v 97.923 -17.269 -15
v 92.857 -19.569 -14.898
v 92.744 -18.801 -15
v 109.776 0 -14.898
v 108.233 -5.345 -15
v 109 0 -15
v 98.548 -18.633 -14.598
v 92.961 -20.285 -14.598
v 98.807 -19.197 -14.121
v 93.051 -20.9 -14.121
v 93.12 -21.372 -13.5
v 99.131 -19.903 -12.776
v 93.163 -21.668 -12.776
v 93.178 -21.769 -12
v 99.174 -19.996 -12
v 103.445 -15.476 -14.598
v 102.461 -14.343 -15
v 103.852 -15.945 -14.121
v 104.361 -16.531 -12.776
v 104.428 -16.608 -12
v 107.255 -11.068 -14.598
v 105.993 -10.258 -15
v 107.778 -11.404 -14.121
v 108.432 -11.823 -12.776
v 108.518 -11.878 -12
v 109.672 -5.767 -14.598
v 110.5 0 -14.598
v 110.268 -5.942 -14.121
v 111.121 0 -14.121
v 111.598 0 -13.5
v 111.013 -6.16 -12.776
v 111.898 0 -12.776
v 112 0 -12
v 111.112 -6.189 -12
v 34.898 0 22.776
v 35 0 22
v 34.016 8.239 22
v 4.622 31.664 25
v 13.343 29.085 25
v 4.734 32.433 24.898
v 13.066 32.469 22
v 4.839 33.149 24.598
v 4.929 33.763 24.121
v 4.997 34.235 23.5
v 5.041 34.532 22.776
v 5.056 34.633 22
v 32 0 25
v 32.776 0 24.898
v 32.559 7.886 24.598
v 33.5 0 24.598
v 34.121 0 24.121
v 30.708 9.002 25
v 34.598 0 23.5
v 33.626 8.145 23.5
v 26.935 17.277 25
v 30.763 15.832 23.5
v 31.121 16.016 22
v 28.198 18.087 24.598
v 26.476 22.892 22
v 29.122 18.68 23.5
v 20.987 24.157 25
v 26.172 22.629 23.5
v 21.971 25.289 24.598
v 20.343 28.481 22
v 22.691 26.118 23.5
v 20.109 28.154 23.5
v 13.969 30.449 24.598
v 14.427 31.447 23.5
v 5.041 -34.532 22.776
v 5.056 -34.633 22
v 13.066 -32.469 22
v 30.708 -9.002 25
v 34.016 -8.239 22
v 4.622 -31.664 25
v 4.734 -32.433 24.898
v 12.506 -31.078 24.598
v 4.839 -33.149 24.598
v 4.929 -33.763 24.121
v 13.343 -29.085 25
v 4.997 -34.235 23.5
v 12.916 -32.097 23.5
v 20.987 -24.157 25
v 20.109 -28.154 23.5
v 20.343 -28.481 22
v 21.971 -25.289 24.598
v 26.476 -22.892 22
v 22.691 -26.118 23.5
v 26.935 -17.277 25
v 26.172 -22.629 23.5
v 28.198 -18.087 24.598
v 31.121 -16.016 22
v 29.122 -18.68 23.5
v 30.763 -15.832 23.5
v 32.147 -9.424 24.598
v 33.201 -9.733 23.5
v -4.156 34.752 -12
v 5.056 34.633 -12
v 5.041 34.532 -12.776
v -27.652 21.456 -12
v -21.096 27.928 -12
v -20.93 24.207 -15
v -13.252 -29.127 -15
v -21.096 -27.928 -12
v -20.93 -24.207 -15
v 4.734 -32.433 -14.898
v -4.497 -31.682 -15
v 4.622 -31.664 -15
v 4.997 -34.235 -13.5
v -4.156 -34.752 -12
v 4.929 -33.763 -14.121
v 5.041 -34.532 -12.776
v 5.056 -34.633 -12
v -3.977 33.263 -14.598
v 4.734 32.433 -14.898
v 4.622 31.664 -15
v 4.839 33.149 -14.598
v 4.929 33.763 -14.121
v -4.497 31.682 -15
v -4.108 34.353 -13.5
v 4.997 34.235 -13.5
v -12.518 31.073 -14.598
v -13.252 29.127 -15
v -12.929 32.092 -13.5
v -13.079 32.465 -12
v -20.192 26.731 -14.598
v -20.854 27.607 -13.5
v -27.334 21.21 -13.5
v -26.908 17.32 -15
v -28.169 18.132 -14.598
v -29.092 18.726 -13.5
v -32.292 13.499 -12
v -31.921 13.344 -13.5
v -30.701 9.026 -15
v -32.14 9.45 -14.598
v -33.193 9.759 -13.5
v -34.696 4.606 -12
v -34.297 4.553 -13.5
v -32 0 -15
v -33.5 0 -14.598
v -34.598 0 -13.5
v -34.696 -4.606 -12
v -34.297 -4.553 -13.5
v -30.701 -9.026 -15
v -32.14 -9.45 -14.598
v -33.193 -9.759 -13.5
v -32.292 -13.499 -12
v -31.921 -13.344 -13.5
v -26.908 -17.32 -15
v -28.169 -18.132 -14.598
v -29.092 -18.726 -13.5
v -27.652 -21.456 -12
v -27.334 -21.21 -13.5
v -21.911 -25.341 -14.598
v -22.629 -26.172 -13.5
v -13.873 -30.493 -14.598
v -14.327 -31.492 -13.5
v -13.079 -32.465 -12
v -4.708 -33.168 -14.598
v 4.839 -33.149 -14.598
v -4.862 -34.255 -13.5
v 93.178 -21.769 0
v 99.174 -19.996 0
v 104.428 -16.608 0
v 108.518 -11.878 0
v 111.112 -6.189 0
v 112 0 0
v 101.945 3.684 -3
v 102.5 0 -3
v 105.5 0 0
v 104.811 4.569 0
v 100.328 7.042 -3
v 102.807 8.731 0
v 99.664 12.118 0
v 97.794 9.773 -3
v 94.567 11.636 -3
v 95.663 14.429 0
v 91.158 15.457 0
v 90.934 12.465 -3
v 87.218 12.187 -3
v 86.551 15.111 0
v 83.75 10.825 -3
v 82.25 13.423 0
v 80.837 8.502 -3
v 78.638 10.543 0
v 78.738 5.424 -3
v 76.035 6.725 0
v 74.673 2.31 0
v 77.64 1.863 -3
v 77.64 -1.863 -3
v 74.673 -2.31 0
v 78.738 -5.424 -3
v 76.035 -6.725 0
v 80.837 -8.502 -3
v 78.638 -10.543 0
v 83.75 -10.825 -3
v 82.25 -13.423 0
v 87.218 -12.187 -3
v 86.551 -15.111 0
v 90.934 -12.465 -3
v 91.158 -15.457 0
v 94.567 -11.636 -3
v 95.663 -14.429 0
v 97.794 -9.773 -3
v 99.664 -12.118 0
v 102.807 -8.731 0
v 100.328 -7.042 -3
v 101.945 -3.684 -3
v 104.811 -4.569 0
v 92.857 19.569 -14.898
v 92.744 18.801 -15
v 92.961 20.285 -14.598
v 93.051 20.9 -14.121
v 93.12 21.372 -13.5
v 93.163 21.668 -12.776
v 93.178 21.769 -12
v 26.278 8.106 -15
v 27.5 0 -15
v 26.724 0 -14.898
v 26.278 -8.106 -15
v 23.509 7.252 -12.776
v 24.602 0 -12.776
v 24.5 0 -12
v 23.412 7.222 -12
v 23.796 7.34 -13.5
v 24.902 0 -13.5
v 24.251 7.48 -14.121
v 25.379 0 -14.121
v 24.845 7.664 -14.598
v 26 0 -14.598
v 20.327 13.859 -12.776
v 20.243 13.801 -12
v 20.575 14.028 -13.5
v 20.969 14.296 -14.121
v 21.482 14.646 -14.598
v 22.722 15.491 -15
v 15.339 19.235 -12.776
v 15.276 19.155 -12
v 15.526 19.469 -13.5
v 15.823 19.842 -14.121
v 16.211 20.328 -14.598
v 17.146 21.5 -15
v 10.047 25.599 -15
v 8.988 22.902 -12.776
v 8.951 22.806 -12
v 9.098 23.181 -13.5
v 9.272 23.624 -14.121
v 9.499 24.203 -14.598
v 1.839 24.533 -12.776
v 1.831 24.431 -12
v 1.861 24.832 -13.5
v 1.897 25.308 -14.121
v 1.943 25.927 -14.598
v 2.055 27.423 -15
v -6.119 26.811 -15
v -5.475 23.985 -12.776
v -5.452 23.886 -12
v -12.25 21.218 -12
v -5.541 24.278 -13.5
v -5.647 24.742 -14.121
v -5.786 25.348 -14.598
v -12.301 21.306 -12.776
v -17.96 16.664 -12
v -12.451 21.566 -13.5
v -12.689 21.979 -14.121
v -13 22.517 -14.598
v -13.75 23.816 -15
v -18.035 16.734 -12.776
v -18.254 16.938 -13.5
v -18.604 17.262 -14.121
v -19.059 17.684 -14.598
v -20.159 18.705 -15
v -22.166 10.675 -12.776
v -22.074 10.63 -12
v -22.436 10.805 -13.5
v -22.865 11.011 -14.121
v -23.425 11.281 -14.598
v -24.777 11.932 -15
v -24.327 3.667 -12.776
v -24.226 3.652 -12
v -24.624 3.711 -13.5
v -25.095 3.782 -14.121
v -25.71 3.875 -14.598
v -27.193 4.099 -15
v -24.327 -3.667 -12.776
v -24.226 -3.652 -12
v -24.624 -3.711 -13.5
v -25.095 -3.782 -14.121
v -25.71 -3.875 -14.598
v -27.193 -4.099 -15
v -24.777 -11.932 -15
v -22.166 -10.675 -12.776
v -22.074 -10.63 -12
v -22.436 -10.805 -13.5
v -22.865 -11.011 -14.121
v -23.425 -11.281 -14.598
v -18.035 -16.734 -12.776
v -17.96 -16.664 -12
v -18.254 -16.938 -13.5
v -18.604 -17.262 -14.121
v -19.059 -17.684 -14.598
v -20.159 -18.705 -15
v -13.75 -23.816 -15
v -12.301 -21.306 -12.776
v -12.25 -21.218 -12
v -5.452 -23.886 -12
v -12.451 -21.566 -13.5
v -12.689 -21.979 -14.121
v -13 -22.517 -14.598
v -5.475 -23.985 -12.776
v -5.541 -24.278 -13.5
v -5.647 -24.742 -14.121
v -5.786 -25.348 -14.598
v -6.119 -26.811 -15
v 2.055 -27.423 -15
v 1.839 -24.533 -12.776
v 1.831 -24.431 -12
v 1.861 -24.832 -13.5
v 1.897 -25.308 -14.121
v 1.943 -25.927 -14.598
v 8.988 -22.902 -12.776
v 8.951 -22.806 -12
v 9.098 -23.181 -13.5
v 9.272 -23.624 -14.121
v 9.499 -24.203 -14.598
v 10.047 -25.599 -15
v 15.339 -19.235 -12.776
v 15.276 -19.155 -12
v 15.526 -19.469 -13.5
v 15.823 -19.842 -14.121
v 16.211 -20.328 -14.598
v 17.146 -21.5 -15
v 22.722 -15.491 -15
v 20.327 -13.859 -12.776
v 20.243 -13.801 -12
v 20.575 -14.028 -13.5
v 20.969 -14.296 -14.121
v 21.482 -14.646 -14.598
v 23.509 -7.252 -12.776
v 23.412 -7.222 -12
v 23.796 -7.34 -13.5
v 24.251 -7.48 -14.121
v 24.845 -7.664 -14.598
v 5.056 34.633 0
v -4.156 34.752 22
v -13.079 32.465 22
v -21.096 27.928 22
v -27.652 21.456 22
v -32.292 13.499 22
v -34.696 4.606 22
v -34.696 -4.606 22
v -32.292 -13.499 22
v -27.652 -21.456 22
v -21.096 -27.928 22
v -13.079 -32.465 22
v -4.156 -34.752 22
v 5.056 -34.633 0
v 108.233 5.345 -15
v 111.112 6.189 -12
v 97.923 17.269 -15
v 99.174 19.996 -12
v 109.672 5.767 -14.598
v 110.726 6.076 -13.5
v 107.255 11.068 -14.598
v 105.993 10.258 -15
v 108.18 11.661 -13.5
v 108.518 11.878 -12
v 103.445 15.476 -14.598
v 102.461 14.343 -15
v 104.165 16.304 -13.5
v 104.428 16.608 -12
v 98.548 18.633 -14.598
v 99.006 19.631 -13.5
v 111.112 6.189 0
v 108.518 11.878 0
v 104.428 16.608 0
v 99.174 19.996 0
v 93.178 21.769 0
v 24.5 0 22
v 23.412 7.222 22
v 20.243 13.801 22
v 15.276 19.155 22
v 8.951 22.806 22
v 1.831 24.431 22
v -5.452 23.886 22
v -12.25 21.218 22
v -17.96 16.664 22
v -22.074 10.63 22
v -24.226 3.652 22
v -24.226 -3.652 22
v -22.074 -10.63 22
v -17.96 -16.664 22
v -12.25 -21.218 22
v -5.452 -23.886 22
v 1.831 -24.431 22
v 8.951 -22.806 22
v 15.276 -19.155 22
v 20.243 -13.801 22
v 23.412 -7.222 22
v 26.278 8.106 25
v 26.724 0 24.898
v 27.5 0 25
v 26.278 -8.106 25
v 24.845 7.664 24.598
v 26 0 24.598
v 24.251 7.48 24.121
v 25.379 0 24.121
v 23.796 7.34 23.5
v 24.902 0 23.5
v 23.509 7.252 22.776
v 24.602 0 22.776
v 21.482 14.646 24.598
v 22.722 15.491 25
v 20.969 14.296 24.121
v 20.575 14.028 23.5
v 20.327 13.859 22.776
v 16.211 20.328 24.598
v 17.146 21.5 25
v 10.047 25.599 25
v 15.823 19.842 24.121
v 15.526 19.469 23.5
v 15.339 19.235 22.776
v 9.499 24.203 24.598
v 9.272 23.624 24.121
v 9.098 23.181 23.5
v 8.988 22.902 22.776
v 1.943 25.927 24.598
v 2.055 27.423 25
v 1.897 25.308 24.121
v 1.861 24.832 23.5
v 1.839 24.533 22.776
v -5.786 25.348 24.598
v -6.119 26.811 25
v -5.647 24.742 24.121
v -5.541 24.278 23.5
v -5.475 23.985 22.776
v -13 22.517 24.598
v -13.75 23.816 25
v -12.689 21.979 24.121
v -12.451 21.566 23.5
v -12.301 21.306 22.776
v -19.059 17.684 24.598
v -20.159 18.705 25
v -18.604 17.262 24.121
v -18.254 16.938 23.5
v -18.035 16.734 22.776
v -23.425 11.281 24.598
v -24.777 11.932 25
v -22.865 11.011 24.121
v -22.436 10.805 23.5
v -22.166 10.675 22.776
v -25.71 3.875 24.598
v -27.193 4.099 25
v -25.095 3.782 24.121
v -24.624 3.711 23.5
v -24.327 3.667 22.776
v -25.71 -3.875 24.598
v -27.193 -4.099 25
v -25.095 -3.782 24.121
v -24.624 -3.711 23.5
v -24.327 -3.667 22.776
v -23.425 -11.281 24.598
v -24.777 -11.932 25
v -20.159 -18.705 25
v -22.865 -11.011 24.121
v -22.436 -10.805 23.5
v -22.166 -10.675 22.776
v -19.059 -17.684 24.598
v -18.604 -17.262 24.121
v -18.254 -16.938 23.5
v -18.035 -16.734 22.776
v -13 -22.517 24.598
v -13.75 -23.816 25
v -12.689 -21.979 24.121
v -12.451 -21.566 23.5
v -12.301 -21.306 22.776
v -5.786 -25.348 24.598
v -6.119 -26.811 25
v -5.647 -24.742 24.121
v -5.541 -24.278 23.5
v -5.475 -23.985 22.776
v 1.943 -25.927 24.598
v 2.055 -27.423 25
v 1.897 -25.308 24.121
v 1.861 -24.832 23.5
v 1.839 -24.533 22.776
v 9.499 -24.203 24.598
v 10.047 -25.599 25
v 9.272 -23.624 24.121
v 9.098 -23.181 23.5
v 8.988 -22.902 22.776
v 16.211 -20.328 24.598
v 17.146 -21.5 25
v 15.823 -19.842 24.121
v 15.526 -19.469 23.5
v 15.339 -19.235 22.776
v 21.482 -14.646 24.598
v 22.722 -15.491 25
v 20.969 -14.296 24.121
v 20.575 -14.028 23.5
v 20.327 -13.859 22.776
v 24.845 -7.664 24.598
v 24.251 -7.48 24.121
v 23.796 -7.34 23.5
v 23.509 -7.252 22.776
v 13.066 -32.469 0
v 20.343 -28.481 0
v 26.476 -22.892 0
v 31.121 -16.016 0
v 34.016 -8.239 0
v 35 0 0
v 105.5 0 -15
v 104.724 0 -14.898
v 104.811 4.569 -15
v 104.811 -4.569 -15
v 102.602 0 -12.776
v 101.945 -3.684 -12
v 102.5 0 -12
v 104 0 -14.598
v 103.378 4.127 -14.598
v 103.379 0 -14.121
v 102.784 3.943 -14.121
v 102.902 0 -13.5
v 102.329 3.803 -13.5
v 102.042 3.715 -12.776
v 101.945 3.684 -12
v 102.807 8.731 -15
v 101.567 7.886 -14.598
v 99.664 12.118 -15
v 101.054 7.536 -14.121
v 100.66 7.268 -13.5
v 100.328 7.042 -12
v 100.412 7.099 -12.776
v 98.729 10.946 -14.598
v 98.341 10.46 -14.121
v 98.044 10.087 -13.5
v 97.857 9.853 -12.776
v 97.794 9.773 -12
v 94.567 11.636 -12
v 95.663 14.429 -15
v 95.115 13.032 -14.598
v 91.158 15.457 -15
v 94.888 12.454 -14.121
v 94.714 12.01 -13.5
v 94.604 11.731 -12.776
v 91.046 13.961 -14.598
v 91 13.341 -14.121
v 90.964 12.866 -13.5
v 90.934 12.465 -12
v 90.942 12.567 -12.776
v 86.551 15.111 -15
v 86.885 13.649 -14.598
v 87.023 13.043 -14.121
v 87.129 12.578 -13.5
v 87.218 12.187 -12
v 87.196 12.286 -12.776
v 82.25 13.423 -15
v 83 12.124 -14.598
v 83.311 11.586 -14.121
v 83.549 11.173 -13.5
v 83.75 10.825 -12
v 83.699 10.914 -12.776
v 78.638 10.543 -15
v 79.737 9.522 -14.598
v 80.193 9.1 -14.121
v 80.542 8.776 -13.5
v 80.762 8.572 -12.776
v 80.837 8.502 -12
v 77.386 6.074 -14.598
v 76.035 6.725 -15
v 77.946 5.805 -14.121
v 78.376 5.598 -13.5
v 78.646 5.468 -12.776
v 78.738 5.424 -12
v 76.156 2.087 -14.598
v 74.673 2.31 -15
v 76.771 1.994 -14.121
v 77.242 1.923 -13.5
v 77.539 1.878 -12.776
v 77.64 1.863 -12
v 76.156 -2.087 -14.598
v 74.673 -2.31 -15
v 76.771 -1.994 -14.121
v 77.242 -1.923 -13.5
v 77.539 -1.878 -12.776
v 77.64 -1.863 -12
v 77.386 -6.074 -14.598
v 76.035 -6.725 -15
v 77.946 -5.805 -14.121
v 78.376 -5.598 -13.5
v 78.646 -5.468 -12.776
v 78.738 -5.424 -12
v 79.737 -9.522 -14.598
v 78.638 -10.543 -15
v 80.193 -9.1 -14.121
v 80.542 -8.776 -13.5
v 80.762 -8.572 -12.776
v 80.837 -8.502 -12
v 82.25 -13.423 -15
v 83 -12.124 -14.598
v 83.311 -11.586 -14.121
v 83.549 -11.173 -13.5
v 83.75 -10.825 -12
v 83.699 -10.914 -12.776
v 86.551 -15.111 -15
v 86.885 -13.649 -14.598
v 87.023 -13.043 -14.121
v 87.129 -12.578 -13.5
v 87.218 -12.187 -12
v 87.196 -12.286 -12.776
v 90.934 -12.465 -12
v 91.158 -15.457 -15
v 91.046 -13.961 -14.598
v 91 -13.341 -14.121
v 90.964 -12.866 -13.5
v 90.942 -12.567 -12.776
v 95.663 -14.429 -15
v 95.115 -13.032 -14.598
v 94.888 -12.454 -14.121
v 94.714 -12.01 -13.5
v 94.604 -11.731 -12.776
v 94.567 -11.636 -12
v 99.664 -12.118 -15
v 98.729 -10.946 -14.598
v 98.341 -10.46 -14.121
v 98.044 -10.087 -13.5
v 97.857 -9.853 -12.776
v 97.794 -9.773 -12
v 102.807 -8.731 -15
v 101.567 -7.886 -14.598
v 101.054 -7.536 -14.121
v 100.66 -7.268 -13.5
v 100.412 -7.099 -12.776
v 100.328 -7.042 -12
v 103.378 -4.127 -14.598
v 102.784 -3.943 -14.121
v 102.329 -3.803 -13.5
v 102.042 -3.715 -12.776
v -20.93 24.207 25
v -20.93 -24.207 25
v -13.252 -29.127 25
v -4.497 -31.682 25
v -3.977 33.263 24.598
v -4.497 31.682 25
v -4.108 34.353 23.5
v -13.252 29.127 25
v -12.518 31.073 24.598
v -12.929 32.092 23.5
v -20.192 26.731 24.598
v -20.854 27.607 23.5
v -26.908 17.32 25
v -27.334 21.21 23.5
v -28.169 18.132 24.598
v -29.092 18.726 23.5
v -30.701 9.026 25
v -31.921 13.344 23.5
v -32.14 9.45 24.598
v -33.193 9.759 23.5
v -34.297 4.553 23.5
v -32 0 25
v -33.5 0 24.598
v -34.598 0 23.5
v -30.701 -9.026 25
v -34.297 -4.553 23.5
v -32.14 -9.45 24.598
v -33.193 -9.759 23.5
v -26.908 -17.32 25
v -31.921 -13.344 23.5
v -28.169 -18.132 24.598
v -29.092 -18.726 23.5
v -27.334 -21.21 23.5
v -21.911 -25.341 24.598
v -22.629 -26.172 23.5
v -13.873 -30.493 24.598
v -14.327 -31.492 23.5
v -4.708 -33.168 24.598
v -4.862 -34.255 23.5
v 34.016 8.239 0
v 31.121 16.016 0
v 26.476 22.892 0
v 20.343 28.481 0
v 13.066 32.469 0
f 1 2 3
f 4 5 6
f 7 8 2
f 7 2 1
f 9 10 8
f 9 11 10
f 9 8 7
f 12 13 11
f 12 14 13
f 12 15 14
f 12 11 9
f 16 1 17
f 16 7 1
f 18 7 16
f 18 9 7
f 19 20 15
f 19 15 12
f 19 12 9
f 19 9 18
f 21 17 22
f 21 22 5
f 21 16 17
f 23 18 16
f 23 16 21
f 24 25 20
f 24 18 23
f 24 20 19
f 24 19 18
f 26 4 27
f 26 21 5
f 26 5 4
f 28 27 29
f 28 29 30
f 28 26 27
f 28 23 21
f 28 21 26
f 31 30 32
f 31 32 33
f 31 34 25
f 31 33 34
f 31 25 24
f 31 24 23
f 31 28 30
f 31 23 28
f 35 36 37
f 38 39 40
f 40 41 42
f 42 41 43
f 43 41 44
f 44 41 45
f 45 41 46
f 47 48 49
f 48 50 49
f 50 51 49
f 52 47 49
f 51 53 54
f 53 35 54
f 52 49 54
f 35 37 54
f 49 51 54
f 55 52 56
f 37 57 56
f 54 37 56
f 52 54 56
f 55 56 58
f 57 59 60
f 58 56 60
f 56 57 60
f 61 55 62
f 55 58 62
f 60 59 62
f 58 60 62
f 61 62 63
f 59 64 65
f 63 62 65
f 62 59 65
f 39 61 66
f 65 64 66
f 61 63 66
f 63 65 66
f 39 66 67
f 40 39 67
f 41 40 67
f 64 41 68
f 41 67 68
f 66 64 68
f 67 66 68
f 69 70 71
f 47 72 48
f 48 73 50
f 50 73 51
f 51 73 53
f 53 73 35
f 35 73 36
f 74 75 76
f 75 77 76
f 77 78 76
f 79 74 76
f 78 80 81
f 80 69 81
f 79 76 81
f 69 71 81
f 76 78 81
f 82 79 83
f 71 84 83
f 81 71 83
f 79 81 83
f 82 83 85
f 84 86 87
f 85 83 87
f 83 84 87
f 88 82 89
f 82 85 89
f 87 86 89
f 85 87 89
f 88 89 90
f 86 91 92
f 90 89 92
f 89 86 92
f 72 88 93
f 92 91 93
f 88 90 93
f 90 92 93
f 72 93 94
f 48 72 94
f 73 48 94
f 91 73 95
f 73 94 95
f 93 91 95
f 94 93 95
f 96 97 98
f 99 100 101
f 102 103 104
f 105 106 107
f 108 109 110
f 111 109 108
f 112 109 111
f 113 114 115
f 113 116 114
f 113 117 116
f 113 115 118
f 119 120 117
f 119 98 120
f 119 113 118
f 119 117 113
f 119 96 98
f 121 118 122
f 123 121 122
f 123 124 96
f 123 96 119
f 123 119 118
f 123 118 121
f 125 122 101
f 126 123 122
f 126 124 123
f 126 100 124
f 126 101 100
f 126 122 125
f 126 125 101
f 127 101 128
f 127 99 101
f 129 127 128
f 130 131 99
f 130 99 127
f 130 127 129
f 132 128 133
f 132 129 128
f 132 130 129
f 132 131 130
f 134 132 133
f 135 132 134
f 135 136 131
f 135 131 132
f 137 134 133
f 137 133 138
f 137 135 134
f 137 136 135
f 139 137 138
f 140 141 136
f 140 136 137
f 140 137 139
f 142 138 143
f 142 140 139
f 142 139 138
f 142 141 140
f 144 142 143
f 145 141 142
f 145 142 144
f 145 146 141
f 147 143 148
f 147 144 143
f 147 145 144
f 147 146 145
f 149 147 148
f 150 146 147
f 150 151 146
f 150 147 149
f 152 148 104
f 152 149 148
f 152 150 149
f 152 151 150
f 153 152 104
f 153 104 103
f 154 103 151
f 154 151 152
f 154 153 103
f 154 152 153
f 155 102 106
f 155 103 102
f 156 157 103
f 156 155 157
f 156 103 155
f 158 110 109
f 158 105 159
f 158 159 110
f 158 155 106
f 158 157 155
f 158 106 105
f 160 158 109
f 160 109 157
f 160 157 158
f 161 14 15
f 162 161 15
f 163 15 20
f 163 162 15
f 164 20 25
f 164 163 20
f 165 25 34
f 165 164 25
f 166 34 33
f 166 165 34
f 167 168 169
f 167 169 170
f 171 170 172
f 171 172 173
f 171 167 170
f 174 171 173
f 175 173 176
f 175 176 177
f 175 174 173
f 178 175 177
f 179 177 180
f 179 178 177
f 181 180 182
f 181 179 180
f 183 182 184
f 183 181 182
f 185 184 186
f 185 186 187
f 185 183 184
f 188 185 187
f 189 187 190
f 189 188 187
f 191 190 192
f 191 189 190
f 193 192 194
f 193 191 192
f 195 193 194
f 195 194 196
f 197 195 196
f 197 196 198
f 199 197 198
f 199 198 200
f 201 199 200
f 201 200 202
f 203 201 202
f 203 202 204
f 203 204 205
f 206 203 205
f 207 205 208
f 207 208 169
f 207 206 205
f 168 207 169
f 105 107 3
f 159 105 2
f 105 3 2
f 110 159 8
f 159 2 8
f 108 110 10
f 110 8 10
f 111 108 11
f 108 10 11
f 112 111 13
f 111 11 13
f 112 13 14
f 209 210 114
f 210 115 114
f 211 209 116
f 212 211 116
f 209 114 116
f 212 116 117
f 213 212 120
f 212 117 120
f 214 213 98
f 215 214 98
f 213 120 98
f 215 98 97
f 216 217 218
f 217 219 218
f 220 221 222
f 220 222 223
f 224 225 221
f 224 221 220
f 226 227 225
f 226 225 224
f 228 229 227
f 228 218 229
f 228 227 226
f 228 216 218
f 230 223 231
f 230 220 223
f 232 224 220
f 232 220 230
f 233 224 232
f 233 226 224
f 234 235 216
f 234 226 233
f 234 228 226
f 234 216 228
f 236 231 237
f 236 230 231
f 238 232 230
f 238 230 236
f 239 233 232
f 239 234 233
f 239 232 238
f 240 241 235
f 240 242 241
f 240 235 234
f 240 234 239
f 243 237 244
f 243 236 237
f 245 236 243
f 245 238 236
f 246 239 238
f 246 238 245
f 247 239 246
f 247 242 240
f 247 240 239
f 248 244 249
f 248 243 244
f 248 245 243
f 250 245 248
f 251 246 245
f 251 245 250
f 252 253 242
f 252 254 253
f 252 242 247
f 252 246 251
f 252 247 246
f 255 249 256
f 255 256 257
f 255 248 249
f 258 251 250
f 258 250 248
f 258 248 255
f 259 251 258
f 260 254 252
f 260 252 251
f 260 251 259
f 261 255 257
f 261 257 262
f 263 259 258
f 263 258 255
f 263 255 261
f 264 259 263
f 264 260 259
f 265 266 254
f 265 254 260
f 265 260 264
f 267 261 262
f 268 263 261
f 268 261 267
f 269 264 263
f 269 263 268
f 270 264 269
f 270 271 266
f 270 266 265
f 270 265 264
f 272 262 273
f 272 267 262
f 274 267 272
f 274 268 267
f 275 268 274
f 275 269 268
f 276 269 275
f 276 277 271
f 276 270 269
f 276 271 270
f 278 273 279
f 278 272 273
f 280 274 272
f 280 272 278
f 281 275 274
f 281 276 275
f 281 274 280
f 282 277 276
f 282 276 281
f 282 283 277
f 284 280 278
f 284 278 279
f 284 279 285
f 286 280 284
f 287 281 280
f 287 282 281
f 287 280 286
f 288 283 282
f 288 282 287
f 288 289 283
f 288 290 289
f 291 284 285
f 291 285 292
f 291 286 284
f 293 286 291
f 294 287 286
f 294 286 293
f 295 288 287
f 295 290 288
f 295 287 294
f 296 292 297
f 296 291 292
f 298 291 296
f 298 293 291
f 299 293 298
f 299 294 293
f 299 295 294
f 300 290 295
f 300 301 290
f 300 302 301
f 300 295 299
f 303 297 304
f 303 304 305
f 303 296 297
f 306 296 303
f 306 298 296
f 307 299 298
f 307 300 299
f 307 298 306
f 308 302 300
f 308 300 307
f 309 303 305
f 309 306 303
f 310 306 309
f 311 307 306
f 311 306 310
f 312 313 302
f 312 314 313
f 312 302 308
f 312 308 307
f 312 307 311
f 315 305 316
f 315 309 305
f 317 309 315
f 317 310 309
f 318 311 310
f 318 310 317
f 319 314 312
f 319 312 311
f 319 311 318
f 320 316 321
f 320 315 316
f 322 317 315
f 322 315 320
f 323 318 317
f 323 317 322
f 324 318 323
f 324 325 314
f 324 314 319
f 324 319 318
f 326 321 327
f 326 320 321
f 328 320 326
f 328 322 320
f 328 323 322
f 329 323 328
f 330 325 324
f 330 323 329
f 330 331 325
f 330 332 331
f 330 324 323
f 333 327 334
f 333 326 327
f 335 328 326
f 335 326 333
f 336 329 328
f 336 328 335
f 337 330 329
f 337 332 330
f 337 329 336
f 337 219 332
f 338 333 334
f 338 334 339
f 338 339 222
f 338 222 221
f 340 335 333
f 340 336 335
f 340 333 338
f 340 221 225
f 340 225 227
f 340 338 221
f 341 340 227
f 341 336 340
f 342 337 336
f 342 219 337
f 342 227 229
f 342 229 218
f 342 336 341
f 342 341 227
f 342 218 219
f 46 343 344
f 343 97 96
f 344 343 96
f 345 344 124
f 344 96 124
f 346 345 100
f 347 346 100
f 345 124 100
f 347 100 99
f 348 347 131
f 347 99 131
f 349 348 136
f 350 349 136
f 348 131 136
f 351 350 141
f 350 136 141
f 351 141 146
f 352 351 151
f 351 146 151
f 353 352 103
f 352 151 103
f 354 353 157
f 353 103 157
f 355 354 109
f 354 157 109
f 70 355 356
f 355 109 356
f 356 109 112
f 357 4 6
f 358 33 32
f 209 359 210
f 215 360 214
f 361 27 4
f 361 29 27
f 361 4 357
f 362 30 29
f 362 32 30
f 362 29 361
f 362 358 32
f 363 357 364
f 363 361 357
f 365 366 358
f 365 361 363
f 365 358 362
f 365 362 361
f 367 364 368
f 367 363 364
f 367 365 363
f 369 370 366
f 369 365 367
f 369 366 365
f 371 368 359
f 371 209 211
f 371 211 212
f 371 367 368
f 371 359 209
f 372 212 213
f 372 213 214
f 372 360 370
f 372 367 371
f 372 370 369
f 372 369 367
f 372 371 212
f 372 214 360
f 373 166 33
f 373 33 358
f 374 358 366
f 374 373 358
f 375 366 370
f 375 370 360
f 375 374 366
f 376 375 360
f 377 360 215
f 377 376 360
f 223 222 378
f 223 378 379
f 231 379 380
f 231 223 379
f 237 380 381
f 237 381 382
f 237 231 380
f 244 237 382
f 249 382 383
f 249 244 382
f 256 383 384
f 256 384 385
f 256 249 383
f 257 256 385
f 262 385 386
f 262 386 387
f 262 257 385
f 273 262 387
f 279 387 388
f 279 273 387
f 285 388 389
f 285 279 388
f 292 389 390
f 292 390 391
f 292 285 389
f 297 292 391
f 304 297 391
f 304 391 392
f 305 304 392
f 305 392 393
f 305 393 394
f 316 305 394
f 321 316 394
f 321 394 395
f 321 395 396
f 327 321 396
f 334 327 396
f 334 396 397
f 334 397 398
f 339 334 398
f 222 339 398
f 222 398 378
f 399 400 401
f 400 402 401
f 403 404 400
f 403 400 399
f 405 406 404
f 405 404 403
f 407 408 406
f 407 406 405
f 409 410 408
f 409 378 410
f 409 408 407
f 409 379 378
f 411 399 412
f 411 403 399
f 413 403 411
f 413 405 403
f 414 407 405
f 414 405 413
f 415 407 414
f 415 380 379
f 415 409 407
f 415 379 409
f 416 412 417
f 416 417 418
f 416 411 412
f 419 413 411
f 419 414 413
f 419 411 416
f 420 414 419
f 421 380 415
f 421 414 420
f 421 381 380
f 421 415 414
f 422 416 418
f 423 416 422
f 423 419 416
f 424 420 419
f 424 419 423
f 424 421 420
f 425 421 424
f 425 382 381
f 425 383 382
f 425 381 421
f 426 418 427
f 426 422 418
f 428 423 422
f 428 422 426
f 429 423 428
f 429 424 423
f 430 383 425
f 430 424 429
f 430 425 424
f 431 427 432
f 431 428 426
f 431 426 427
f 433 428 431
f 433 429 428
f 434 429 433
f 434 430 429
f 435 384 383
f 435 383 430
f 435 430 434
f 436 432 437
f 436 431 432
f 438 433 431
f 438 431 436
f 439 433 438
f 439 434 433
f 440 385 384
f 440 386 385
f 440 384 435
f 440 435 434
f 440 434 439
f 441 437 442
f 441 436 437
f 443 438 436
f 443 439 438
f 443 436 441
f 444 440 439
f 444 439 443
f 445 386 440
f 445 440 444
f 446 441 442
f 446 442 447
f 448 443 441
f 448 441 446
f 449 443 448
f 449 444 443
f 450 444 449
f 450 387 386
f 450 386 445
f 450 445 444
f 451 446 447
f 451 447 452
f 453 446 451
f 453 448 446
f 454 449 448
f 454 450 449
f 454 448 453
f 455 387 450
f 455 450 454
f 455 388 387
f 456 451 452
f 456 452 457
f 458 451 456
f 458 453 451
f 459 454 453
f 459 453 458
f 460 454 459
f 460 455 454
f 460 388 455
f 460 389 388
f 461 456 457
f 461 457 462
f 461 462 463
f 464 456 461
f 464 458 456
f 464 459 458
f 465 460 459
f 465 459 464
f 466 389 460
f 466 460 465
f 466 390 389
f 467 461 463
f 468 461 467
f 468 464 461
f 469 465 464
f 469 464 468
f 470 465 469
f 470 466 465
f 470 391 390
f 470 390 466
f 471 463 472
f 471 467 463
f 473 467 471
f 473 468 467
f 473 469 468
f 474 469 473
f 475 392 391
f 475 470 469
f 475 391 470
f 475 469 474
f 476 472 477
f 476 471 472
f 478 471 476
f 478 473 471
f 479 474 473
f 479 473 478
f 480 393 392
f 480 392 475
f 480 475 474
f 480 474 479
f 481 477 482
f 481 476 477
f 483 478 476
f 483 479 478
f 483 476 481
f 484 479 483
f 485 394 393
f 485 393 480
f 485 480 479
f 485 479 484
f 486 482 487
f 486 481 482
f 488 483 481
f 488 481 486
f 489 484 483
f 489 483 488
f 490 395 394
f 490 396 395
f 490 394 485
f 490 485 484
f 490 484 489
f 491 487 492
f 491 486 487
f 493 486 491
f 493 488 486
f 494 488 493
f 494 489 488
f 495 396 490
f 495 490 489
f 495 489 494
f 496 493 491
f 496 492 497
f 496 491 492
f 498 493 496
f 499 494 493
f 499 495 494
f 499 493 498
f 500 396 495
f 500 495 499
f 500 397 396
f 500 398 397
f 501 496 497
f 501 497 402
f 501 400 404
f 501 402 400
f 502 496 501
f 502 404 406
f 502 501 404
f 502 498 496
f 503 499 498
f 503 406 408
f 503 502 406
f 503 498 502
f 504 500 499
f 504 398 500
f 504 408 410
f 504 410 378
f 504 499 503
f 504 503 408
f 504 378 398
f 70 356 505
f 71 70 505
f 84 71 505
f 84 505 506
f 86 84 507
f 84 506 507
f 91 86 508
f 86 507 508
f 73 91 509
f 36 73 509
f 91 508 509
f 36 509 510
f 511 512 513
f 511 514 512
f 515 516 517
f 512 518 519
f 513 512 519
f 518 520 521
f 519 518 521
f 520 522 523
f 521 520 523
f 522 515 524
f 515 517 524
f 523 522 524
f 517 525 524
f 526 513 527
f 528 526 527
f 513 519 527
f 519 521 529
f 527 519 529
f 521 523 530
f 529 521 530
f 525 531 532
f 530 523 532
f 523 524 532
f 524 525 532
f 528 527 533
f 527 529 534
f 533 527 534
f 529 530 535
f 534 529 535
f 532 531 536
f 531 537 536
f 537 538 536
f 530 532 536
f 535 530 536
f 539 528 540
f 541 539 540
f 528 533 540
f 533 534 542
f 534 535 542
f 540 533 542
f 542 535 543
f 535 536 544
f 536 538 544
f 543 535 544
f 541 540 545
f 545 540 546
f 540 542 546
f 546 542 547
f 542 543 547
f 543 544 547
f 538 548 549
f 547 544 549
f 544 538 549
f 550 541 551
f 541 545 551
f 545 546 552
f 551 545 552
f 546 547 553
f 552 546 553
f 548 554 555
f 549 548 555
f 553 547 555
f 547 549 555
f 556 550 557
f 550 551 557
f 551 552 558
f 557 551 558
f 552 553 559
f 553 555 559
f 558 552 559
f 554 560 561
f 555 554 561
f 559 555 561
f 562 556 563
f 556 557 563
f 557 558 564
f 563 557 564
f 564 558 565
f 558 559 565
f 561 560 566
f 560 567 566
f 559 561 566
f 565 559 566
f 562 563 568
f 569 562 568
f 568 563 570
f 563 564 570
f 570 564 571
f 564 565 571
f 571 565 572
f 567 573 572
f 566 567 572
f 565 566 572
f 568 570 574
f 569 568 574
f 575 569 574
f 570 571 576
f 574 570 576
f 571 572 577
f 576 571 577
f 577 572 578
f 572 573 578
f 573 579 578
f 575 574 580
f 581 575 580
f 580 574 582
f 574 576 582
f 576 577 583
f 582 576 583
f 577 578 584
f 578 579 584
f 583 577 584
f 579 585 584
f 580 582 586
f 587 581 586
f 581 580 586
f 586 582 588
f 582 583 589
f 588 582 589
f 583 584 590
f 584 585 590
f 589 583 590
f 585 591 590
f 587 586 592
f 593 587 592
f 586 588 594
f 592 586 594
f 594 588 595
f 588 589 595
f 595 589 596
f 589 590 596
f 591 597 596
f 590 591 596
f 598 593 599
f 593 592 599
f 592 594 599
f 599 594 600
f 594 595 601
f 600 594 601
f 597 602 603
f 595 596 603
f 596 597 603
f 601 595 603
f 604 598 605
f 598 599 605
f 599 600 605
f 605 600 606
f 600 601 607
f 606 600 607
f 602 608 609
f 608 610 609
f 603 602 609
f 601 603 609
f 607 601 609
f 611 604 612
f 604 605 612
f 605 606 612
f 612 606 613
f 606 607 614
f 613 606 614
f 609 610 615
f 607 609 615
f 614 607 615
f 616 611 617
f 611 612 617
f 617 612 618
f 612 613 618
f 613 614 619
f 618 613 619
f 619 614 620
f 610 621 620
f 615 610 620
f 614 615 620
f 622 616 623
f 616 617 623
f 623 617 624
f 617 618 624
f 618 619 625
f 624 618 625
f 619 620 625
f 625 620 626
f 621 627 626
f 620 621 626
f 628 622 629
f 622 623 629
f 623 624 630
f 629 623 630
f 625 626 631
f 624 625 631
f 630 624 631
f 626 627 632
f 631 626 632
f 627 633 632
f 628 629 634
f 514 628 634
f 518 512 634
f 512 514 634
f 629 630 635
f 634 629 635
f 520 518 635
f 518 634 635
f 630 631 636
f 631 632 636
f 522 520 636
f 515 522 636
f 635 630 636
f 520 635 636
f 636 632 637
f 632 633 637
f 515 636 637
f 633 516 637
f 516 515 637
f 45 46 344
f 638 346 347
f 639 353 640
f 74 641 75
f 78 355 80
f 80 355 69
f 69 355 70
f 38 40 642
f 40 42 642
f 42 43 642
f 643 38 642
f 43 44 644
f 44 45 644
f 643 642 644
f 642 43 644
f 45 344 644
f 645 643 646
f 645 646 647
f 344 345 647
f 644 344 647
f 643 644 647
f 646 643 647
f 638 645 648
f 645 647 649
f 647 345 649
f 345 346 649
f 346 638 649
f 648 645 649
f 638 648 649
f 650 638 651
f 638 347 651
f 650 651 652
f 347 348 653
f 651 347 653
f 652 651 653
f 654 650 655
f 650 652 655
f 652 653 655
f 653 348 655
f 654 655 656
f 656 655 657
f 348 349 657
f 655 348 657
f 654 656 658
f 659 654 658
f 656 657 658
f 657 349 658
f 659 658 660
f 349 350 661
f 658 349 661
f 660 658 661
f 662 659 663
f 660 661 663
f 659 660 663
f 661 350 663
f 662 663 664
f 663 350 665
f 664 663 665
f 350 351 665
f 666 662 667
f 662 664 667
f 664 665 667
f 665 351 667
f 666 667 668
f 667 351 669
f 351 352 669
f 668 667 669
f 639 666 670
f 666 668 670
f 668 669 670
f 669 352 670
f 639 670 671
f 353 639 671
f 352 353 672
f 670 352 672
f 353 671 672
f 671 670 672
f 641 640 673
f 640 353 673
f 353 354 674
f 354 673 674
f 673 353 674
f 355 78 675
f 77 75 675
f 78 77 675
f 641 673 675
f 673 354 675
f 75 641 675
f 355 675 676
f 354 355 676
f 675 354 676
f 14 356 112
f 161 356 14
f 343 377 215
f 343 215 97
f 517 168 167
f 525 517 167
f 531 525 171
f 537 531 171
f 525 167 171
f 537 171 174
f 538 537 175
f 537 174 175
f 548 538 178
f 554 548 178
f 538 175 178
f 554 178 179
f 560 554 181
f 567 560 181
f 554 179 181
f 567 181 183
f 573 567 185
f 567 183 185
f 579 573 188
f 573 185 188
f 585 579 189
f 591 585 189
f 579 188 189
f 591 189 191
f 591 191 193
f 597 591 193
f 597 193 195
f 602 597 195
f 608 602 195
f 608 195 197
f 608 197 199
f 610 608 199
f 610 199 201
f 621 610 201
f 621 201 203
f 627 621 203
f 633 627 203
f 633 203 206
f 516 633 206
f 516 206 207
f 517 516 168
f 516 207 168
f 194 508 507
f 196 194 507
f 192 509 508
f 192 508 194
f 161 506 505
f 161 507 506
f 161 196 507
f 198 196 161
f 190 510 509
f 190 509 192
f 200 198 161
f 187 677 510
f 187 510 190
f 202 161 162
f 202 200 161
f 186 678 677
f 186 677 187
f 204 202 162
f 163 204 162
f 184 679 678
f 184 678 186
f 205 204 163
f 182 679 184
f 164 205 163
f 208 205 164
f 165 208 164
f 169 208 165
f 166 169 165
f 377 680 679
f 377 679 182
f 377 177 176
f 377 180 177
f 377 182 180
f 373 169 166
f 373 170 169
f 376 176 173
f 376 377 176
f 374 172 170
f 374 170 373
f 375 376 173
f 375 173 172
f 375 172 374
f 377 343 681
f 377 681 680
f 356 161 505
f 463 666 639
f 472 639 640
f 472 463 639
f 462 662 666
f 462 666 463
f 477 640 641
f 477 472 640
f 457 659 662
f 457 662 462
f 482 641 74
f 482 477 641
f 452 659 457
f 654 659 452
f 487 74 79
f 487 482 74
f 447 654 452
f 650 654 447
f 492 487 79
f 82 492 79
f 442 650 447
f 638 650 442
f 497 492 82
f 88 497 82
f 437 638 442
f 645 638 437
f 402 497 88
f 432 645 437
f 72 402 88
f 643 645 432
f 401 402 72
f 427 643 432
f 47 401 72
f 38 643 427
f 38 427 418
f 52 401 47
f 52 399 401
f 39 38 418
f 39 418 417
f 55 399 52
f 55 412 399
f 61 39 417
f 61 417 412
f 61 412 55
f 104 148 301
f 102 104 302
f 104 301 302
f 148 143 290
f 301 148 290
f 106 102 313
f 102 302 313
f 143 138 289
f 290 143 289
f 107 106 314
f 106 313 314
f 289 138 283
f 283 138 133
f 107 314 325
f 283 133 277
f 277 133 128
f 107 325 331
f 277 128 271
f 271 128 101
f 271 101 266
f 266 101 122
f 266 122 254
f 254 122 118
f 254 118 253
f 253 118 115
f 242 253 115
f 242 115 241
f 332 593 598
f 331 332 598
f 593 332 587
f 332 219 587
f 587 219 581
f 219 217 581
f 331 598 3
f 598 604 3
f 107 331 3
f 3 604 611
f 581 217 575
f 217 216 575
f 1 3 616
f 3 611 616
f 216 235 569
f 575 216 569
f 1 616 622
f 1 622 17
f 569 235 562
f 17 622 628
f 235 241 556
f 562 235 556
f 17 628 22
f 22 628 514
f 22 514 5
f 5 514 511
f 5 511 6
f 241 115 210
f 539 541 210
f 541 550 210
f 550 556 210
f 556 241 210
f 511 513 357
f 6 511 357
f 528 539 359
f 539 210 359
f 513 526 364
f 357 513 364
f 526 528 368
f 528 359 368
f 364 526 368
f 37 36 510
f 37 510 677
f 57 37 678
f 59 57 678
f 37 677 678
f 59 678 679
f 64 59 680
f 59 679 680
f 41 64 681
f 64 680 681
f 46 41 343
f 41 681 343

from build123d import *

# Parameters (mm, degrees)
F0_R     = 24.5
F0_R_2   = 12.5
F1_DEPTH = 15
F2_DEPTH = 25
F3_R     = 3
F4_SIZE  = 3


# Not quite as in the source:
# - a feature names something its author has since deleted; it is built from what else it names


with BuildPart() as f1:
    # F0 (on Top) → F1 (new body)
    with BuildSketch(Plane.XY):
        with BuildLine():
            ThreePointArc((35, 0), (26.4758800085, 22.8916530154), (5.0555555556, 34.6329519104))
            ThreePointArc((5.0555555556, 34.6329519104), (-35, 0), (5.0555555556, -34.6329519104))
            ThreePointArc((5.0555555556, -34.6329519104), (26.4758800085, -22.8916530154), (35, 0))
        make_face()
        Circle(F0_R, mode=Mode.SUBTRACT)
        with BuildLine():
            Line((93.1777777778, 21.7692840579), (5.0555555556, 34.6329519104))
            ThreePointArc((5.0555555556, 34.6329519104), (26.4758800085, 22.8916530154), (35, 0))
            ThreePointArc((35, 0), (26.4758800085, -22.8916530154), (5.0555555556, -34.6329519104))
            Line((5.0555555556, -34.6329519104), (93.1777777778, -21.7692840579))
            ThreePointArc((93.1777777778, -21.7692840579), (68, 0), (93.1777777778, 21.7692840579))
        make_face()
        with BuildLine():
            ThreePointArc((112, 0), (106.6419817196, 14.3890390383), (93.1777777778, 21.7692840579))
            ThreePointArc((93.1777777778, 21.7692840579), (68, 0), (93.1777777778, -21.7692840579))
            ThreePointArc((93.1777777778, -21.7692840579), (106.6419817196, -14.3890390383), (112, 0))
        make_face()
        with Locations((90, 0)):
            Circle(F0_R_2, mode=Mode.SUBTRACT)
    extrude(amount=-F1_DEPTH)

    # F0 (on Top) → F2 (join)
    with BuildSketch(Plane.XY):
        with BuildLine():
            ThreePointArc((35, 0), (26.4758800085, 22.8916530154), (5.0555555556, 34.6329519104))
            ThreePointArc((5.0555555556, 34.6329519104), (-35, 0), (5.0555555556, -34.6329519104))
            ThreePointArc((5.0555555556, -34.6329519104), (26.4758800085, -22.8916530154), (35, 0))
        make_face()
        Circle(F0_R, mode=Mode.SUBTRACT)
    extrude(amount=F2_DEPTH)

    # F3
    f3_edges = [f1.edges().sort_by_distance(p)[0] for p in [
        (-5.055556, 34.632952, 25),
        (-24.5, 0, 25),
        (-35, 0, -15),
        (49.116667, -28.201118, -15),
        (112, 0, -15),
        (49.116667, 28.201118, -15),
        (-24.5, 0, -15),
        (77.5, 0, -15),
    ]]
    fillet(f3_edges, radius=F3_R)

    # F4
    f4_edges = [f1.edges().sort_by_distance(p)[0] for p in [
        (77.5, 0, 0),
    ]]
    chamfer(f4_edges, length=F4_SIZE)


solid = f1.part
